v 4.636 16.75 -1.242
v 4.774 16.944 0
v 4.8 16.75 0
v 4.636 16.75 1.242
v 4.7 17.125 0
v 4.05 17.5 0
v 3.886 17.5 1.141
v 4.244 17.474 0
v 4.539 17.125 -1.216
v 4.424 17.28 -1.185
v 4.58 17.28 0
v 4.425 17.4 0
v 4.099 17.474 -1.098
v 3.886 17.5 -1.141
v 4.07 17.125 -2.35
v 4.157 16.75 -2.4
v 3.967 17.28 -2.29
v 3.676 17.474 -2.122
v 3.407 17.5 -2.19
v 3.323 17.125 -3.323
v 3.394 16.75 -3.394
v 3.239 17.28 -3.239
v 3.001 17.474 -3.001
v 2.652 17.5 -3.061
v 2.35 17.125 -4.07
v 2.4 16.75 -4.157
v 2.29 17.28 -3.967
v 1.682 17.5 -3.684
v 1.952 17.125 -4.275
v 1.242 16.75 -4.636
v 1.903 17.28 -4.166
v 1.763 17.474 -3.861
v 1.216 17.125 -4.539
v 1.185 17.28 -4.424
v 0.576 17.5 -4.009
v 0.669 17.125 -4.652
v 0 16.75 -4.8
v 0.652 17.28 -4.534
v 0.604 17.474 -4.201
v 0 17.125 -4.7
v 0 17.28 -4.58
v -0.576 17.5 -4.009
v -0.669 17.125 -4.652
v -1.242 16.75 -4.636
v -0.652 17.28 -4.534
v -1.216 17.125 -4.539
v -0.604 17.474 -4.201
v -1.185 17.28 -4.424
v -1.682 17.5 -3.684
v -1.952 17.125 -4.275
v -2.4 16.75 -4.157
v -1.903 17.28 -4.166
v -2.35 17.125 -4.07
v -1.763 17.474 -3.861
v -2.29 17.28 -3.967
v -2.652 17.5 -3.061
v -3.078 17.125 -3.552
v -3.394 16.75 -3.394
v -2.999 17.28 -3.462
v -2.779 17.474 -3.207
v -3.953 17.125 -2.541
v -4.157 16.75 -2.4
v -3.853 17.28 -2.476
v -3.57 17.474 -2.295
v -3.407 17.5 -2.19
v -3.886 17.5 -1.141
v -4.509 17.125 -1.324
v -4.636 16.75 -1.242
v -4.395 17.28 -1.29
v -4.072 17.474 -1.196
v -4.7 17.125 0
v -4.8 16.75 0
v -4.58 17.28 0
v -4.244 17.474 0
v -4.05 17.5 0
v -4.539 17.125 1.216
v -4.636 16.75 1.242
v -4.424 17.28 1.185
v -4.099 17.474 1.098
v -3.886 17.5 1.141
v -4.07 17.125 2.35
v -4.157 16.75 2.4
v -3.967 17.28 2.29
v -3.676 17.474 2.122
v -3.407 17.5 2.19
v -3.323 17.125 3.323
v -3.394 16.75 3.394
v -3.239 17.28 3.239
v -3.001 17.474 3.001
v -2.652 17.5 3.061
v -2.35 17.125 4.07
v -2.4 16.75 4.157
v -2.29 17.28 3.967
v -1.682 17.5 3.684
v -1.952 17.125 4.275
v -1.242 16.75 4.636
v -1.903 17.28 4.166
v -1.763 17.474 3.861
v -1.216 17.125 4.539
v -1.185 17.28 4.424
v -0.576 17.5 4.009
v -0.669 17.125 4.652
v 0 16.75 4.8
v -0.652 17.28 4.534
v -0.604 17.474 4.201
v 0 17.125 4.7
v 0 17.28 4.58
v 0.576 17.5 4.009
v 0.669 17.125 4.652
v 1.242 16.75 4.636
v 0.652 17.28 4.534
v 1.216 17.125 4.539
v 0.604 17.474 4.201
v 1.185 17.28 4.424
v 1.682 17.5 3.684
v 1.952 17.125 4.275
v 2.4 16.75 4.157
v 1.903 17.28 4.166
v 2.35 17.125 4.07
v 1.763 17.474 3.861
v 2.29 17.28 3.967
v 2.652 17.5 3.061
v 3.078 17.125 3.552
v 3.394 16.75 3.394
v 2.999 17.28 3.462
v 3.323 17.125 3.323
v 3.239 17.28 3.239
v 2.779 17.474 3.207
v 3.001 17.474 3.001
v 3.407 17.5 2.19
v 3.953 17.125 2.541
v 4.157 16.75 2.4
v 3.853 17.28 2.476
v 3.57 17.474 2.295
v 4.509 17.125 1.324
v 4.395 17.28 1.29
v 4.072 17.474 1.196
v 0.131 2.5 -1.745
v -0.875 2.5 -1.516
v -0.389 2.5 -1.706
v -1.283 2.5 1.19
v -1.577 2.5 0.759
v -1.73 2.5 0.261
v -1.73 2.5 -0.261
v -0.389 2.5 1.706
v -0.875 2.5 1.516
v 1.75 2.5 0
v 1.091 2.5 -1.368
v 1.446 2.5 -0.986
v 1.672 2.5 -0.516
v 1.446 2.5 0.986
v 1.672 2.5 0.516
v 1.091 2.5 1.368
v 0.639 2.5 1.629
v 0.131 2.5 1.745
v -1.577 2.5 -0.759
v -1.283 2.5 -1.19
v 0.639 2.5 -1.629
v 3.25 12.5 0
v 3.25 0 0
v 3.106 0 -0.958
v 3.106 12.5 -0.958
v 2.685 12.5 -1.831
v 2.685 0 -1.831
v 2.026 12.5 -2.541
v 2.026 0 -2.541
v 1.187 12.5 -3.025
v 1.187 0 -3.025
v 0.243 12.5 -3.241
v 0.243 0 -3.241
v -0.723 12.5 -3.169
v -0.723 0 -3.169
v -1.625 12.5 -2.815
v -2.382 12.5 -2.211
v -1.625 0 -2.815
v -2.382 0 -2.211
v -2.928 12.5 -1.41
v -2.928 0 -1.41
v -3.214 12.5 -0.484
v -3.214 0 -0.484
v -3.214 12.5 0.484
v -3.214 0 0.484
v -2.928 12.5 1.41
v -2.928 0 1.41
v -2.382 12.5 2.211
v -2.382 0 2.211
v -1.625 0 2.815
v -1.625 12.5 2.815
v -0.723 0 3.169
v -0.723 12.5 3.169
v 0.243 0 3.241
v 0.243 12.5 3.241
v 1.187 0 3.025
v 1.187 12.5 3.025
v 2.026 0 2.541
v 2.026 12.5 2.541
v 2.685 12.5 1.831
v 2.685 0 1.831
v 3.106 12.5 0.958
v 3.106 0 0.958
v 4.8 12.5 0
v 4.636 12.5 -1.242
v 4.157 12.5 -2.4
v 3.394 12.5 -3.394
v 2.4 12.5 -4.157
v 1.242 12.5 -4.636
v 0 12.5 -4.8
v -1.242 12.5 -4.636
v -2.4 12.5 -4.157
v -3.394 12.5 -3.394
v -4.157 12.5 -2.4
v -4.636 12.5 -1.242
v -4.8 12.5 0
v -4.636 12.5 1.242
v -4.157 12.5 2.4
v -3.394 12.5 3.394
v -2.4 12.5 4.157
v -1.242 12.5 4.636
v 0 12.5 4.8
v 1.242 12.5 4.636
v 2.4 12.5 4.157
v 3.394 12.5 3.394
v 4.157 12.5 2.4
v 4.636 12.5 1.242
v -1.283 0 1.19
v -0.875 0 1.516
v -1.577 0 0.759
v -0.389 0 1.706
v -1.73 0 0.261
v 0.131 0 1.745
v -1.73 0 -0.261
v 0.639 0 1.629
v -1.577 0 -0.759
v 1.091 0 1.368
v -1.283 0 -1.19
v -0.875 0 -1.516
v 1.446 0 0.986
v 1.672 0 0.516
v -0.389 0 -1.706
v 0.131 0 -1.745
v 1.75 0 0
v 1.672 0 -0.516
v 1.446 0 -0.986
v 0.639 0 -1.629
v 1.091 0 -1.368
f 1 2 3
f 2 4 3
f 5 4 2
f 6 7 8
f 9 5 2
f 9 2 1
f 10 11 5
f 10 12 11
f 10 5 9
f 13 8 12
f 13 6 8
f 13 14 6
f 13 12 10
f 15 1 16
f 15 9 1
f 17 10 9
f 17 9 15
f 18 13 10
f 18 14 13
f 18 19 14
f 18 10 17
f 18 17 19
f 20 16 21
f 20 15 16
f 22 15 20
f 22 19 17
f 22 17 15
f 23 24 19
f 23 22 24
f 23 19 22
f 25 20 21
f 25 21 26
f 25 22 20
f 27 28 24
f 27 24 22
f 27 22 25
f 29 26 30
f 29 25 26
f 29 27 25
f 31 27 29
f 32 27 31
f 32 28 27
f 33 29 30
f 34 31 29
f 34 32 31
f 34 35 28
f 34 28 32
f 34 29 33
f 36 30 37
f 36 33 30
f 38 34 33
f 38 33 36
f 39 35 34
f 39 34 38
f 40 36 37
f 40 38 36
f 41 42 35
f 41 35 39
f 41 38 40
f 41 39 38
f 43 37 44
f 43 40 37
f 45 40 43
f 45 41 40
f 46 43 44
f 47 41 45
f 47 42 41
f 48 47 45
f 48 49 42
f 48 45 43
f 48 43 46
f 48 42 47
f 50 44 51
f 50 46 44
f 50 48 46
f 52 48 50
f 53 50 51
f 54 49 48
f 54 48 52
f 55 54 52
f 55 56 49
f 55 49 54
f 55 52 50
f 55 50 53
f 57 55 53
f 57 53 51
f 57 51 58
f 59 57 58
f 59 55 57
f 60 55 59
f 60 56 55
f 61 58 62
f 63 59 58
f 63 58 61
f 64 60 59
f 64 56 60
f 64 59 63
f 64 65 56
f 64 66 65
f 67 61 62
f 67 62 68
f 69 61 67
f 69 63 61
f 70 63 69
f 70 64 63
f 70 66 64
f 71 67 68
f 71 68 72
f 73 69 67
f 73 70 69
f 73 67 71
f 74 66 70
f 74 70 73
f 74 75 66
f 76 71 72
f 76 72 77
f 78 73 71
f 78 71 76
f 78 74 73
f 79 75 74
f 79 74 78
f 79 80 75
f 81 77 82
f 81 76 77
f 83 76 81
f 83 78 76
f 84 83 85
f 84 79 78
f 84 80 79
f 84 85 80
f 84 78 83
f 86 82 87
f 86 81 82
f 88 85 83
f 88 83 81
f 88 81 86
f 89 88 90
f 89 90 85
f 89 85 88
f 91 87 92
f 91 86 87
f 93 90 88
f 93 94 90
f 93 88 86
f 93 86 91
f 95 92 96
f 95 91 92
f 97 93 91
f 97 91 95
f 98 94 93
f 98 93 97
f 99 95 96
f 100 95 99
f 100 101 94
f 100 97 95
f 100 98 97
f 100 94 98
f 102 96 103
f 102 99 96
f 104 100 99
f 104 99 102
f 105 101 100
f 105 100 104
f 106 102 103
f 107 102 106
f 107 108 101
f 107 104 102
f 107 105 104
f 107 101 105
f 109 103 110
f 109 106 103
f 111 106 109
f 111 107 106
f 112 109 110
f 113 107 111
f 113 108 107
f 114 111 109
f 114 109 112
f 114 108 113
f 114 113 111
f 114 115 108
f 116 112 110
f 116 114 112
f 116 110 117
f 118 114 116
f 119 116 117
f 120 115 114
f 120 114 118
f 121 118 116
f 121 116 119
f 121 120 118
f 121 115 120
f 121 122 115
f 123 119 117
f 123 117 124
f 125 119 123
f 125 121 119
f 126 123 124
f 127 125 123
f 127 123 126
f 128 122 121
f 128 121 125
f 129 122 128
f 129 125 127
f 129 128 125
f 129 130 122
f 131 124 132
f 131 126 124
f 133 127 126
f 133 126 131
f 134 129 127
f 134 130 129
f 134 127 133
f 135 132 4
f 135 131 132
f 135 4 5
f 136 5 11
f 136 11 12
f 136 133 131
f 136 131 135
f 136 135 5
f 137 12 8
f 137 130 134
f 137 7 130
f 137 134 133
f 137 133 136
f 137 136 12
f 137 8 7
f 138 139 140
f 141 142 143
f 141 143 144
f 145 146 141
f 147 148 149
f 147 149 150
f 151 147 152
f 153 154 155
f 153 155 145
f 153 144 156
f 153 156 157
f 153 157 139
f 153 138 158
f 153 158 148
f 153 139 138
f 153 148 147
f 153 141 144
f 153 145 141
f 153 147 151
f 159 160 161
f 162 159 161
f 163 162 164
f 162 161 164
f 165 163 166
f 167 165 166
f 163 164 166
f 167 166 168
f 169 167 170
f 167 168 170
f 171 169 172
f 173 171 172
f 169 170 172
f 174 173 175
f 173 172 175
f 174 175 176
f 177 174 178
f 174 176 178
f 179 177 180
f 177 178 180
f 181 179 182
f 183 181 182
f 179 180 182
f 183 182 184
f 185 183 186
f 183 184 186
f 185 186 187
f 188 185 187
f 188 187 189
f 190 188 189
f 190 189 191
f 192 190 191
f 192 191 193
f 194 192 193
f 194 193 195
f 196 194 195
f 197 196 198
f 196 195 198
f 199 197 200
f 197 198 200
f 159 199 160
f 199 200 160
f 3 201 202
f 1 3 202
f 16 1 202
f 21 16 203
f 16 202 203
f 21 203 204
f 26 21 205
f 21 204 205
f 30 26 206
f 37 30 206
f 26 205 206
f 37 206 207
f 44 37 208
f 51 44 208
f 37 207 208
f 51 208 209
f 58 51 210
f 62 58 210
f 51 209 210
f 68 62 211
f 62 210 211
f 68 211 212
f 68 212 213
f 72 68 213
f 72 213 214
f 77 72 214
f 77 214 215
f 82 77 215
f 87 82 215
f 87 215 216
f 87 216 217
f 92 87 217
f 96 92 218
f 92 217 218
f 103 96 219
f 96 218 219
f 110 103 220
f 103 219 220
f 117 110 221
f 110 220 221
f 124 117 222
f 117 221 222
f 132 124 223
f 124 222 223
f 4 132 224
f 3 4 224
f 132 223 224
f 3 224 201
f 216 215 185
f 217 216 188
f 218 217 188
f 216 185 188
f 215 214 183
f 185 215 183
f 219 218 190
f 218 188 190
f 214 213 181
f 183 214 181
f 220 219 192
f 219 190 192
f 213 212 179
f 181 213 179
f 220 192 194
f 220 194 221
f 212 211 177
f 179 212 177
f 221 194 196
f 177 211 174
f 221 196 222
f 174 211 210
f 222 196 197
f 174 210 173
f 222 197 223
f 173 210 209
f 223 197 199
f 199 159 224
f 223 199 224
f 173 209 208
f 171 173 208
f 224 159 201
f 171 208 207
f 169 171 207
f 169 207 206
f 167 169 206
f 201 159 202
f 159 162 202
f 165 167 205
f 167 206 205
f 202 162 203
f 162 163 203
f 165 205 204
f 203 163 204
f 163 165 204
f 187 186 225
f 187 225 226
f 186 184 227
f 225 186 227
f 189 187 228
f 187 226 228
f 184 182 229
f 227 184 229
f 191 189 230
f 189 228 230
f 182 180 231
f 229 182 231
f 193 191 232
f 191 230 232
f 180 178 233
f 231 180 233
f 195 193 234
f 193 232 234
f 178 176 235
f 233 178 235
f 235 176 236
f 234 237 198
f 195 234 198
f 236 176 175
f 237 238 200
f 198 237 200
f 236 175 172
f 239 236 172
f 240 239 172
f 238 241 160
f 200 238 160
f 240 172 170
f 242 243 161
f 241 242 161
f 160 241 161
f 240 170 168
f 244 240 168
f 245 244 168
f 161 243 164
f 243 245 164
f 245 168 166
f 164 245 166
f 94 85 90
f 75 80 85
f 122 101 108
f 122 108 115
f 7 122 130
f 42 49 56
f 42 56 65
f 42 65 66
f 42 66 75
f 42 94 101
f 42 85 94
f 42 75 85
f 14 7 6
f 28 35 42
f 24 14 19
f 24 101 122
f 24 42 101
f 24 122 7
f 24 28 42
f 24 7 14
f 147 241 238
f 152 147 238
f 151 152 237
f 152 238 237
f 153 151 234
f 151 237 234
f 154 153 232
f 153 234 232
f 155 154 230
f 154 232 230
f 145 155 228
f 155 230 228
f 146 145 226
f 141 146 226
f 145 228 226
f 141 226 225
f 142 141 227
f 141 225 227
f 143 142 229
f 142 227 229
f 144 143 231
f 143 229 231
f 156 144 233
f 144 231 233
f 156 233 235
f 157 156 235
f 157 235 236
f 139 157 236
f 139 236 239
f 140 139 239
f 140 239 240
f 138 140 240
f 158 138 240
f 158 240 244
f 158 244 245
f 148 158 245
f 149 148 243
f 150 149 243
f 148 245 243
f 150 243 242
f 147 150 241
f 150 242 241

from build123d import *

# Parameters (mm, degrees)
SKETCH1_R           = 3.25
BOSS_EXTRUDE1_DEPTH = 12.5
SKETCH2_R           = 1.75
CUT_EXTRUDE1_DEPTH  = 2.5
SKETCH6_R           = 4.8
BOSS_EXTRUDE2_DEPTH = 5
FILLET1_R           = 0.75


with BuildPart() as part:
    # Sketch1 → Boss-Extrude1 (new body)
    with BuildSketch(Plane(origin=(0, 0, 0), x_dir=(1, 0, 0), z_dir=(0, 1, 0))):
        Circle(SKETCH1_R)
    extrude(amount=BOSS_EXTRUDE1_DEPTH)

    # Sketch2 → Cut-Extrude1 (cut)
    with BuildSketch(Plane.XZ):
        Circle(SKETCH2_R)
    extrude(amount=-CUT_EXTRUDE1_DEPTH, mode=Mode.SUBTRACT)

    # Sketch6 → Boss-Extrude2 (add)
    with BuildSketch(Plane(origin=(0, 12.5, 0), x_dir=(1, 0, 0), z_dir=(0, 1, 0))):
        Circle(SKETCH6_R)
    extrude(amount=BOSS_EXTRUDE2_DEPTH)

    # Fillet1
    fillet1_edges = [part.edges().sort_by_distance(p)[0] for p in [
        (-4.8, 17.5, 0),
    ]]
    fillet(fillet1_edges, radius=FILLET1_R)


solid = part.part
